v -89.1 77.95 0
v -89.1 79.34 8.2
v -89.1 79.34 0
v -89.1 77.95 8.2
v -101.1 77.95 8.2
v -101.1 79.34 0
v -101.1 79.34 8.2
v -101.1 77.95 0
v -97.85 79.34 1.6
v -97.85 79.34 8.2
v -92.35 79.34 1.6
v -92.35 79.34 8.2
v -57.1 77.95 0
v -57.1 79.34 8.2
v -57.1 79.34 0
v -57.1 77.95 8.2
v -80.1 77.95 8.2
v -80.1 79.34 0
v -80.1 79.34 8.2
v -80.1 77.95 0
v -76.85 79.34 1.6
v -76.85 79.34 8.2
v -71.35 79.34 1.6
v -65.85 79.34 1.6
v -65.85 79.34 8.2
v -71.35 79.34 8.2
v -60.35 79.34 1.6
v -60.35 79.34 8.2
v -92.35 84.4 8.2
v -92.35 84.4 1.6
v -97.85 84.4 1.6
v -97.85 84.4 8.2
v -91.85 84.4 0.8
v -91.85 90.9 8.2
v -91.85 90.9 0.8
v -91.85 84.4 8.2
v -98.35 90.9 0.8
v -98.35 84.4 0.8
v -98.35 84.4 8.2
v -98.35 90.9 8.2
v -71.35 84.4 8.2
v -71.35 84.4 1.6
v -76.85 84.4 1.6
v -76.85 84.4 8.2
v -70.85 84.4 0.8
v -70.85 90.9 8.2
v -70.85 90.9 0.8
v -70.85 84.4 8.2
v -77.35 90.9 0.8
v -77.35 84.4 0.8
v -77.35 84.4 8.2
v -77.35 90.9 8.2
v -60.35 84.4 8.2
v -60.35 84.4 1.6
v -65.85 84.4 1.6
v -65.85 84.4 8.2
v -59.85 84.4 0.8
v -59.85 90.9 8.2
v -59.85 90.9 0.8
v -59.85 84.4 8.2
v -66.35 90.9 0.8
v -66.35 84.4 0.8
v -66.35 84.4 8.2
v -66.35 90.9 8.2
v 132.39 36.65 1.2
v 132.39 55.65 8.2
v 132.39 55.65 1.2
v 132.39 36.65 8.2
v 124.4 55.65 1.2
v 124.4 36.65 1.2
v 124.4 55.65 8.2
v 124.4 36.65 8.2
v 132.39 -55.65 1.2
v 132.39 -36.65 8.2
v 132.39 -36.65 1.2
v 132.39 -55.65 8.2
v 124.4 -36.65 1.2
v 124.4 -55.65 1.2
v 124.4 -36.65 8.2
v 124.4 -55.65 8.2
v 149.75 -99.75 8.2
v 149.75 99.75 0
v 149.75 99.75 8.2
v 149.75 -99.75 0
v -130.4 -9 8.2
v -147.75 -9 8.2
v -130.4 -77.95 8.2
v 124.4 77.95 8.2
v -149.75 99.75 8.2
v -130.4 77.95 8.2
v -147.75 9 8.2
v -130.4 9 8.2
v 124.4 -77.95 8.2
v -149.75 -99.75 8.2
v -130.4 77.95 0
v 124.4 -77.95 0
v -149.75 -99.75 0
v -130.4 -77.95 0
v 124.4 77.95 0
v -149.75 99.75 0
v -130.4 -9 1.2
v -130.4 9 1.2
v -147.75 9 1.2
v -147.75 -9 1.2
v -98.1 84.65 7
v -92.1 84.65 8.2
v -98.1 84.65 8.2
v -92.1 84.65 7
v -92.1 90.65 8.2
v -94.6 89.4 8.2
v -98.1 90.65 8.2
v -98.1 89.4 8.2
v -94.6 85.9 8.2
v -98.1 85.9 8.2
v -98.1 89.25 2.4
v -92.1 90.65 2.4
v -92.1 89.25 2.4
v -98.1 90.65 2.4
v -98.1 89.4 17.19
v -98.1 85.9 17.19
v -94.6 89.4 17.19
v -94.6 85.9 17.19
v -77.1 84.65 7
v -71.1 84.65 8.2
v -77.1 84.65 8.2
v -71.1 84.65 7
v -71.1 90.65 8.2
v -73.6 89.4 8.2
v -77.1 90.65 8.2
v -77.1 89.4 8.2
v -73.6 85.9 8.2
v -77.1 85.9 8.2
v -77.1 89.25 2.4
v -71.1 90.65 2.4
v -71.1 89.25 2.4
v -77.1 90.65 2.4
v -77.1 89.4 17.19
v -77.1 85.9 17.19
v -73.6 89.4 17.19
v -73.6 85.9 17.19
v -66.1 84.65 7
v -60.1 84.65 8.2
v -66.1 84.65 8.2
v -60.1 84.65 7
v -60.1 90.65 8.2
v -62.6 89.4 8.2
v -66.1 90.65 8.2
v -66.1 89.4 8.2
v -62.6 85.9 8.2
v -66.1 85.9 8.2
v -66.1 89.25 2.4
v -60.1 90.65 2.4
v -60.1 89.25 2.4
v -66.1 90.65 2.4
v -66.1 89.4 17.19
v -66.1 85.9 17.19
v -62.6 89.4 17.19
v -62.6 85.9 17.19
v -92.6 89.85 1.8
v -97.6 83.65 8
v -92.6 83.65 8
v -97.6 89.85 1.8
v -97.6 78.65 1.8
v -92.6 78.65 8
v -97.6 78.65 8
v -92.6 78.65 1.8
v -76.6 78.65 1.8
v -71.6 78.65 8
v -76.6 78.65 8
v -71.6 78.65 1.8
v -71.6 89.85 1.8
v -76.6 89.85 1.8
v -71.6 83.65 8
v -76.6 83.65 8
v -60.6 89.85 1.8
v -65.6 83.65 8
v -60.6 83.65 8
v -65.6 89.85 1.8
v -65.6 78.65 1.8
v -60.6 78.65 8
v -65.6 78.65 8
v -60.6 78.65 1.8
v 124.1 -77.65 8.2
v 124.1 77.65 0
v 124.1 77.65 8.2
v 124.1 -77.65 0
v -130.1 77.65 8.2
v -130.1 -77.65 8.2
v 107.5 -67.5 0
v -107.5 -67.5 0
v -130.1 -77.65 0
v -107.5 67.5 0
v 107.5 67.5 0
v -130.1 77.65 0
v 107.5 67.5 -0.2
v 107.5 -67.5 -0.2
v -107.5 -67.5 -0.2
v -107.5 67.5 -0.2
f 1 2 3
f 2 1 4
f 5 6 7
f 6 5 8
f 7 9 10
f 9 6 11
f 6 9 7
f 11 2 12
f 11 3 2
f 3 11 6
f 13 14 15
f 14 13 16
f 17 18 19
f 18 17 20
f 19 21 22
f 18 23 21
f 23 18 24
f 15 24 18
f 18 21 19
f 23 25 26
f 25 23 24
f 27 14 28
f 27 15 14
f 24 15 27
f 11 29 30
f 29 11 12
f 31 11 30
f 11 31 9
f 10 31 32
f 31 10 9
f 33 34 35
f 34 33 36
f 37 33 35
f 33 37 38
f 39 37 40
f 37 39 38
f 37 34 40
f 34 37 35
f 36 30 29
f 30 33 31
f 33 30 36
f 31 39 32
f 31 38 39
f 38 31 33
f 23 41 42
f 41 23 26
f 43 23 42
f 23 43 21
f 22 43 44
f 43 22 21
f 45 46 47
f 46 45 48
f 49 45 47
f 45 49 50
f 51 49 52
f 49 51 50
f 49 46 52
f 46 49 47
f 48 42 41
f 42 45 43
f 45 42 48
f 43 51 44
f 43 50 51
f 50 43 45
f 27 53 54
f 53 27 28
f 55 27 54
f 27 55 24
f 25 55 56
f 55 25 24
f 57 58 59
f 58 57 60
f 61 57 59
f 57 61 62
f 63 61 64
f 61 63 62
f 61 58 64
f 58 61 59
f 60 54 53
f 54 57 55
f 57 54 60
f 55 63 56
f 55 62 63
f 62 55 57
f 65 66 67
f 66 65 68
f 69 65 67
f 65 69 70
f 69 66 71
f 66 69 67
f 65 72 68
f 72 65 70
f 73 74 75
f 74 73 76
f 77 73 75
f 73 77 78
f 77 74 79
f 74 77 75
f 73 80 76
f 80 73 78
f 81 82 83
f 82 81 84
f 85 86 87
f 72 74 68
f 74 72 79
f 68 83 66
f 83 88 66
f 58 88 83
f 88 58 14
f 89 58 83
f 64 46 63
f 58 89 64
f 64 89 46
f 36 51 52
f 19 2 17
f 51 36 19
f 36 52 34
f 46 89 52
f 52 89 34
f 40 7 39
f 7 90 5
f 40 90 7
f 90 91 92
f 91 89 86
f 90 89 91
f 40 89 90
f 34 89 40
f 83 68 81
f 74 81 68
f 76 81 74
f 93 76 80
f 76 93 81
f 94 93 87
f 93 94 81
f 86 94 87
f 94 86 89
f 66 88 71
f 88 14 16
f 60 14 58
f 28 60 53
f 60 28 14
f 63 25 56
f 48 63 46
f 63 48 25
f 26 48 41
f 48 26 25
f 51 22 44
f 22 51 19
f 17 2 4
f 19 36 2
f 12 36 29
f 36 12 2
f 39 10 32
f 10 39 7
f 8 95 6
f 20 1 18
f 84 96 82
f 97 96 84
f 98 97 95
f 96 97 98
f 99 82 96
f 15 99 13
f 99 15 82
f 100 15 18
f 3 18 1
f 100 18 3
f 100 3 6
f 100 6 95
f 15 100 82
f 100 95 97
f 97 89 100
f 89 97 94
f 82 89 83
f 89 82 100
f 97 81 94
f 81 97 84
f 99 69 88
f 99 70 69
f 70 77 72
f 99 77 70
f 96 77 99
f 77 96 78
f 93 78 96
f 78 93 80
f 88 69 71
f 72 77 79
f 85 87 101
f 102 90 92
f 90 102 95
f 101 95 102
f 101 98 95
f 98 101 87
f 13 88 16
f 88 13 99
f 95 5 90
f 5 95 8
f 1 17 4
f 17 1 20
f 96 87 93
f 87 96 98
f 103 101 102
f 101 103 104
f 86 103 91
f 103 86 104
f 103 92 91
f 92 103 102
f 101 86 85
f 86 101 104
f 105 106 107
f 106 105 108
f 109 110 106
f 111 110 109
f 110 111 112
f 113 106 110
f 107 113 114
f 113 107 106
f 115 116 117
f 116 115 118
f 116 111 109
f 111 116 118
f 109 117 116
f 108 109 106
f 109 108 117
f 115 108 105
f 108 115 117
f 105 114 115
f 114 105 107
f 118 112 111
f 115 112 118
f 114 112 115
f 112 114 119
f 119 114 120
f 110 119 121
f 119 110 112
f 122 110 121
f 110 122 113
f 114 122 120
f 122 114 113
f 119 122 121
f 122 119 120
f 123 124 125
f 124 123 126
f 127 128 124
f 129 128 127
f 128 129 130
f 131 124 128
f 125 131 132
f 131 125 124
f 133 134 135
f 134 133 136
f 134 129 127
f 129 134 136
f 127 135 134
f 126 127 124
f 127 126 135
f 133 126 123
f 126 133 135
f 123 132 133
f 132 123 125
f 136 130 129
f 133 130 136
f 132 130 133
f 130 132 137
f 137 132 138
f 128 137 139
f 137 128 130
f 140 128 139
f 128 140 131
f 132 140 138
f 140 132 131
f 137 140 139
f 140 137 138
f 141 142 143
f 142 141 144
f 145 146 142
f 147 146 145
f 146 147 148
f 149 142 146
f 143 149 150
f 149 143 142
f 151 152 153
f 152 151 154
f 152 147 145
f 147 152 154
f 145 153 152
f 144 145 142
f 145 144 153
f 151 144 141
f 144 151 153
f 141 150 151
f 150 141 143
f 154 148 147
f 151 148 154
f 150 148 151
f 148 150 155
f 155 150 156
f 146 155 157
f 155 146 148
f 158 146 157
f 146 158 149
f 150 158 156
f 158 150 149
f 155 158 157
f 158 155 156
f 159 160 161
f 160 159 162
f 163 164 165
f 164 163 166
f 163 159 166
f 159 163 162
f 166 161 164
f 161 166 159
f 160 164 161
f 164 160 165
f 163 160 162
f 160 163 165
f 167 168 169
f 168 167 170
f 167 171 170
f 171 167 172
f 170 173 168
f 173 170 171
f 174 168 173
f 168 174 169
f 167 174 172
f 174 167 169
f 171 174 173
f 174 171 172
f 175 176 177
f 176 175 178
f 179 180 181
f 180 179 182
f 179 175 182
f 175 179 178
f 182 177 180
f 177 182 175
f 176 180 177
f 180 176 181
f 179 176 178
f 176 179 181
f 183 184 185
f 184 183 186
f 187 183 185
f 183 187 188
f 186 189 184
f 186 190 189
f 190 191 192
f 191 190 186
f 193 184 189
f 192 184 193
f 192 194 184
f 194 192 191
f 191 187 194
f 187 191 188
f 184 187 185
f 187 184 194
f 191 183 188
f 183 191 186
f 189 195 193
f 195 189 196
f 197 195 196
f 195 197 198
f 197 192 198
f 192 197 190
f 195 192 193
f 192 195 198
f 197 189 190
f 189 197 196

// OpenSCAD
// Insert that holds a Samsung Galaxy Tab A 10.1 (SM-T585) in an IKEA
// RÖDALM 21x30 frame, with the lit display centred in the frame.
//
// Units mm. Seen from the front: x to the right, y up, z = 0 is the front
// (glass side), z = thickness is the back. The tablet lies landscape with
// USB on the left; power and volume are then on the top edge.
//
// The buttons are pressed from the back: a plunger pokes through the back
// panel, its 45° ramp pushes a slider against the button. The button's own
// spring pushes both back.
//
// Print the two halves front face down, black. Sliders and plungers lie
// flat as exported.

part = "assembly"; // [assembly, left, right, slider, plunger] - 3 sliders, 3 plungers

/* [Frame] */
frame_w = 300;          // inside of the frame
frame_h = 200;
frame_clearance = 0.5;  // total per axis

/* [Tablet, landscape, USB left] */
tablet_l = 254.2;
tablet_w = 155.3;
tablet_t = 8.2;
pocket_clearance = 0.3; // per side
// Tablet edge to lit display area (display 215 x 135).
bezel_left = 22.6;      // USB side
bezel_right = 16.6;     // home button side
bezel_top = 10.15;
bezel_bottom = 10.15;

/* [Buttons, top edge, measured from the tablet's left (USB) end] */
power = [30, 40];
volume = [51, 72];
button_protrusion = 1;
// One actuator each: power, volume up/down halves.
actuators = [35, 56, 67];

/* [Openings] */
usb_w = 18;             // pocket for an angled USB-C plug
speaker = [22, 41];     // right end, from each long edge
speaker_depth = 8;
front_skin = 1.2;       // closed front behind the pockets

/* [Actuators] */
act_clear = 0.25;
slider_w = 5;
slider_z0 = 1.8;
slider_back_len = 5;    // slider length at its back face
plunger_d = 6;          // body, larger than the hole in the back panel
plunger_min_z = 2.4;    // flat tip, leaves 1.5 mm stroke above the floor
plunger_floor = 0.8;
stem = 3.5;             // square stem through a 5.5 mm hole
stem_len = 9;           // back panel (~3) plus what you push

/* [Split] */
lap = 10;

$fn = 48;
T = tablet_t;
case_w = frame_w - frame_clearance;
case_h = frame_h - frame_clearance;
c = pocket_clearance;

display_w = tablet_l - bezel_left - bezel_right;
display_h = tablet_w - bezel_top - bezel_bottom;
// Tablet's lower left corner, so that the display centre is at 0,0.
x0 = -(bezel_left + display_w / 2);
y0 = -(bezel_bottom + display_h / 2);
y_top = y0 + tablet_w;

// Actuator geometry in the y-z plane: ramp plane y + z = ramp_c.
slider_z1 = T - 0.2;
tip_y = y_top + button_protrusion;
ramp_c = tip_y + slider_back_len + slider_z1;
py0 = ramp_c - slider_z1 + 1;
py1 = py0 + plunger_d;
stem_y = (py0 + py1) / 2;

module case_body() {
  difference() {
    translate([-case_w / 2, -case_h / 2, 0]) cube([case_w, case_h, T]);
    // Tablet
    translate([x0 - c, y0 - c, -1]) cube([tablet_l + 2 * c, tablet_w + 2 * c, T + 2]);
    // Room for the protruding buttons
    for (r = [power, volume])
      translate([x0 + r[0] - 1, y_top + c - 0.01, -1])
        cube([r[1] - r[0] + 2, button_protrusion + 0.4, T + 2]);
    // Actuator channels, open to the back
    for (a = actuators) {
      x = x0 + a;
      translate([x - slider_w / 2 - act_clear, y_top + c - 0.01, slider_z0 - 0.2])
        cube([slider_w + 2 * act_clear, ramp_c - slider_z0 - y_top - c + act_clear, T]);
      translate([x - plunger_d / 2 - act_clear, py0 - act_clear, plunger_floor])
        cube([plunger_d + 2 * act_clear, plunger_d + 2 * act_clear, T]);
    }
    // USB plug and cable, open to the back
    translate([-case_w / 2 + 2, -usb_w / 2, front_skin])
      cube([x0 - c + case_w / 2 - 2 + 0.01, usb_w, T]);
    // Speakers, open to the back
    for (s = [[y_top - speaker[1], y_top - speaker[0]], [y0 + speaker[0], y0 + speaker[1]]])
      translate([x0 + tablet_l + c - 0.01, s[0], front_skin])
        cube([speaker_depth, s[1] - s[0], T]);
  }
}

module left_mask() {
  translate([-500, -500, -50]) cube([500 - lap / 2, 1000, 100]);
  translate([-lap / 2, -500, -50]) cube([lap, 1000, 50 + T / 2]);
}

module left_half() { intersection() { case_body(); left_mask(); } }
module right_half() { difference() { case_body(); left_mask(); } }

// Profiles in the y-z plane, relative to the tip / plunger front.
module slider(w) {
  linear_extrude(w)
    polygon([
      [0, slider_z0],
      [ramp_c - slider_z0 - tip_y, slider_z0],
      [ramp_c - slider_z1 - tip_y, slider_z1],
      [0, slider_z1],
    ]);
}

module plunger() {
  y_flat = ramp_c - plunger_min_z;
  linear_extrude(plunger_d)
    polygon([
      [py0, ramp_c - py0],
      [y_flat, plunger_min_z],
      [py1, plunger_min_z],
      [py1, T],
      [py0, T],
    ]);
  // Stem, square and on the bed so it prints without support.
  translate([stem_y - stem / 2, T - 0.01, 0]) cube([stem, stem_len, stem]);
}

// Moves a flat-printed part to its place in the frame.
module placed(x, w) {
  translate([x - w / 2, 0, 0]) rotate([90, 0, 90]) children();
}

module assembly() {
  color("dimgray") left_half();
  color("gray") right_half();
  color("white", 0.3) translate([x0, y0, 0]) cube([tablet_l, tablet_w, T]);
  color("deepskyblue", 0.5)
    translate([-display_w / 2, -display_h / 2, -0.2]) cube([display_w, display_h, 0.2]);
  for (i = [0 : len(actuators) - 1]) {
    x = x0 + actuators[i];
    color("orange") placed(x, slider_w) translate([tip_y, 0, 0]) slider(slider_w);
    color("red") translate([x - plunger_d / 2, 0, 0]) rotate([90, 0, 90]) plunger();
  }
}

if (part == "assembly") assembly();
else if (part == "left") left_half();
// Back face down, so its half of the lap joint lies on the bed.
else if (part == "right") translate([0, 0, T]) rotate([0, 180, 0]) right_half();
else if (part == "slider") slider(slider_w);
else if (part == "plunger") translate([-py0, 0, 0]) plunger();

// Holes in the back panel, seen from the BACK: the USB side is then on the
// right, so distances are from the right inner edge of the frame.
for (i = [0 : len(actuators) - 1])
  echo(str("Plunger ", i + 1, ": ", frame_w / 2 + x0 + actuators[i] - plunger_d / 2 + stem / 2,
    " mm from the right inner edge, ", frame_h / 2 - stem_y, " mm from the top, drill 5.5 mm"));
echo(str("USB pocket: ", frame_w / 2 - case_w / 2 + 2, "-", frame_w / 2 + x0 - c,
  " mm from the right inner edge, ", frame_h / 2 - usb_w / 2, "-", frame_h / 2 + usb_w / 2, " mm from the top"));
